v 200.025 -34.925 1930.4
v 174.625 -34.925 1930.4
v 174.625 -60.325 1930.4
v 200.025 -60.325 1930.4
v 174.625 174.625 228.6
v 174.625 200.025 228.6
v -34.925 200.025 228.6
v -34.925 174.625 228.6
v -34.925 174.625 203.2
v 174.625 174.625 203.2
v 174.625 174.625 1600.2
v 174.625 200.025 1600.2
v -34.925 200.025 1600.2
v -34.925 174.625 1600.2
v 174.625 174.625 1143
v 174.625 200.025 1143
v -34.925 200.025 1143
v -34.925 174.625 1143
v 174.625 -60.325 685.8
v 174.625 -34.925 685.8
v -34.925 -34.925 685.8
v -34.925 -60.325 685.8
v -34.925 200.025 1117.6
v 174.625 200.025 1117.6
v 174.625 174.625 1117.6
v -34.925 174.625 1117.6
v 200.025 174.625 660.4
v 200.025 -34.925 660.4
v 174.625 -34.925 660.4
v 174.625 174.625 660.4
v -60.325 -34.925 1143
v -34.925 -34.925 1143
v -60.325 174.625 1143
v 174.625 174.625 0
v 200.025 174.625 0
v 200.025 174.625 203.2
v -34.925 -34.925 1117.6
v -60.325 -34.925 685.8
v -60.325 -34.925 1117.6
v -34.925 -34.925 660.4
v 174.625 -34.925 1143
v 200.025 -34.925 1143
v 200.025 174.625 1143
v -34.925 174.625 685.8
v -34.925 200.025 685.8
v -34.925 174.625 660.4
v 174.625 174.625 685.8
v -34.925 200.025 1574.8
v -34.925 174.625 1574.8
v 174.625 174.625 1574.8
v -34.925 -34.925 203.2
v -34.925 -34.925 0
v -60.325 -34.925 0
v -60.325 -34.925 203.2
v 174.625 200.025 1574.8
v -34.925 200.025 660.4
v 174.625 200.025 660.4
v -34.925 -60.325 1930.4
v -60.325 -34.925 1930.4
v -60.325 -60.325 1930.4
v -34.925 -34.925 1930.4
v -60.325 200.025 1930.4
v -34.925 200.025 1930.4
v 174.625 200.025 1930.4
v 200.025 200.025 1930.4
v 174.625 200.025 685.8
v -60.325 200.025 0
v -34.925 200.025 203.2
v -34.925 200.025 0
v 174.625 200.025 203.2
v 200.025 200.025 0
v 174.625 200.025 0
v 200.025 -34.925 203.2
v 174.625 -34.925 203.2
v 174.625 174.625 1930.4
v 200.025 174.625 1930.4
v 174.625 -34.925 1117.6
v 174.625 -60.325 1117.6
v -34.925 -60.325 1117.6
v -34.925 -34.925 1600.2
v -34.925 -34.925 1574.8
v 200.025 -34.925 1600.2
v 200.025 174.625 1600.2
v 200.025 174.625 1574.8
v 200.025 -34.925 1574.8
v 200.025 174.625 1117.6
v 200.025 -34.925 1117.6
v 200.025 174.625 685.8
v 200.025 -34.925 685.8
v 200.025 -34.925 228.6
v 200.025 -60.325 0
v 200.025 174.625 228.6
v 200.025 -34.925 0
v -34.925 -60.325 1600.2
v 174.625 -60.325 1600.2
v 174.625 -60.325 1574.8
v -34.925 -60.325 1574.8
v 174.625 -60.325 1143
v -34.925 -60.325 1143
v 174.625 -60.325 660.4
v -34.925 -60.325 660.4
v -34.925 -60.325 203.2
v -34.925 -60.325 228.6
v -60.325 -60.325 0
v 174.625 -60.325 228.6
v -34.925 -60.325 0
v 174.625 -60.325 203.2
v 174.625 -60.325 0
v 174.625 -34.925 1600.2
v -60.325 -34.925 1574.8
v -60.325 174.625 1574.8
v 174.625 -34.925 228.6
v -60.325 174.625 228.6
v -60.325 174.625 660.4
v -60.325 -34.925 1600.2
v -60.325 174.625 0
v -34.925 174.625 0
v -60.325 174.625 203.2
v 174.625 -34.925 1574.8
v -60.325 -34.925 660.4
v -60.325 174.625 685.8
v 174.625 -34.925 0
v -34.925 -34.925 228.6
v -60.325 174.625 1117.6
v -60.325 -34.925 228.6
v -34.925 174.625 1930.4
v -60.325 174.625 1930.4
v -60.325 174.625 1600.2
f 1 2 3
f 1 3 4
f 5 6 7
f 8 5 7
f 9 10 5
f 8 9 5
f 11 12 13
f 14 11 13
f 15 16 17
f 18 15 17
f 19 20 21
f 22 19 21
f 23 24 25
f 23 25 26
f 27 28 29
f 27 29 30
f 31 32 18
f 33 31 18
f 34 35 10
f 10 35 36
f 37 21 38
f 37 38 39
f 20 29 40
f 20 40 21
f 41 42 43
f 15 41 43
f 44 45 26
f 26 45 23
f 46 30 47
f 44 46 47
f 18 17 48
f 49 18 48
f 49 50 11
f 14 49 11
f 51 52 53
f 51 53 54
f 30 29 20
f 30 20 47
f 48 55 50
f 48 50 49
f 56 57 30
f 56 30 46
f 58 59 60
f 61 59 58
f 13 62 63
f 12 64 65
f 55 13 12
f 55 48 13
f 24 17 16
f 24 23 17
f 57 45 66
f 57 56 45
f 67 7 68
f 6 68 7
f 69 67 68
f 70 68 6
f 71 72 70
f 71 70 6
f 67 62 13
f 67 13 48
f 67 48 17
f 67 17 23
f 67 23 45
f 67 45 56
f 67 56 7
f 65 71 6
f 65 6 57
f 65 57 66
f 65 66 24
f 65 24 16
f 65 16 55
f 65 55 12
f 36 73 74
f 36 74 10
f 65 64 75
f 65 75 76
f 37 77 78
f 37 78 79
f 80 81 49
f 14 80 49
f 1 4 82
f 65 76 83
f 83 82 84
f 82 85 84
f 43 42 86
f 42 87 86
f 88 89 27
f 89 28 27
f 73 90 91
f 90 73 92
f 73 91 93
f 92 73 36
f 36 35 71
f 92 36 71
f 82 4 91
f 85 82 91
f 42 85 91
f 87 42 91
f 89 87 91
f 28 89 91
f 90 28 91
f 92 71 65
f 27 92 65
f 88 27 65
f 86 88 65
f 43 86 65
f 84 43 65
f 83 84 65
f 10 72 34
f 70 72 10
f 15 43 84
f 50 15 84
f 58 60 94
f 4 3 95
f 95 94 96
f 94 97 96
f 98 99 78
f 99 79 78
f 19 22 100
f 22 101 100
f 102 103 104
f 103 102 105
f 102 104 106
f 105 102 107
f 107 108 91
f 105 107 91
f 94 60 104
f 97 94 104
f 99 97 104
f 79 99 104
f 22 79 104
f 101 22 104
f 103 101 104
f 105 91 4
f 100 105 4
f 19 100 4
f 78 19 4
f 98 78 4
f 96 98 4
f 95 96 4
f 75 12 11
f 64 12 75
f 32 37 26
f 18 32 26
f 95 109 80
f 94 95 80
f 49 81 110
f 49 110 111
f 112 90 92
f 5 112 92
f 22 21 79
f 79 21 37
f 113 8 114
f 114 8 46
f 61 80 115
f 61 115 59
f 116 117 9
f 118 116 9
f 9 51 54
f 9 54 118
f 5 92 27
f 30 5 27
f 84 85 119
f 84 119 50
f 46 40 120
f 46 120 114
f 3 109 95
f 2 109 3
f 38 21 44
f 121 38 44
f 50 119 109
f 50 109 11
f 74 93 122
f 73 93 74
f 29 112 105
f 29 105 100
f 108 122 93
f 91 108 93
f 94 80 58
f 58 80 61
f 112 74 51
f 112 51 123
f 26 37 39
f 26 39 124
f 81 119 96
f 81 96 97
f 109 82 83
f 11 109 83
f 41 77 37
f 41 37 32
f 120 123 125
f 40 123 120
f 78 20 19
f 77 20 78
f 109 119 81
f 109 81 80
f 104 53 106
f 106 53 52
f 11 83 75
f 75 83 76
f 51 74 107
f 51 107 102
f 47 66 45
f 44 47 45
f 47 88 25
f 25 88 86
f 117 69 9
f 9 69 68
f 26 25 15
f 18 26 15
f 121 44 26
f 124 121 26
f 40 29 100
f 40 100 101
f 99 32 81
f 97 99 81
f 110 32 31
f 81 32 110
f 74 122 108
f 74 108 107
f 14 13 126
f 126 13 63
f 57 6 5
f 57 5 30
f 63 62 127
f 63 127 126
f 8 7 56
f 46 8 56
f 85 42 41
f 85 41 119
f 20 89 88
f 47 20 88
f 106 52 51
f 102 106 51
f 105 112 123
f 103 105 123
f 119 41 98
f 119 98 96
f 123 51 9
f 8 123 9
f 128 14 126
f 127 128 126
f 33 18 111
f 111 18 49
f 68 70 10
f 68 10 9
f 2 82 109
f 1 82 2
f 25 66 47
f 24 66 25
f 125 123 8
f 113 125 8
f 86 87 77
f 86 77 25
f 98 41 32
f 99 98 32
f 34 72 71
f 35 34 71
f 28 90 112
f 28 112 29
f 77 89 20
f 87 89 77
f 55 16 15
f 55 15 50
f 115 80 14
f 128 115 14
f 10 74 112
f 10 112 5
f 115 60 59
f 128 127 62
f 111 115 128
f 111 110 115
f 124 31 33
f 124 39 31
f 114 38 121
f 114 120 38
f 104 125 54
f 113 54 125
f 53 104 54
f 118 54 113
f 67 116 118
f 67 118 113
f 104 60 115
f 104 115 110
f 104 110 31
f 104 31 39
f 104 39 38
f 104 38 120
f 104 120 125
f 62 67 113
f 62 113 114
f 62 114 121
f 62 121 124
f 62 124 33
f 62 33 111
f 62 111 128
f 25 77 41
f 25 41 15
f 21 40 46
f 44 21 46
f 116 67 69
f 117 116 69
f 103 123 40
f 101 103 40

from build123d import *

# Parameters (mm, degrees)
F0_W     = 260.35
F0_H     = 260.35
F0_W_2   = 209.55
F0_H_2   = 209.55
F1_DEPTH = 1930.4
F2_W     = 209.55
F2_H     = 330.2
F2_H_2   = 431.8
F2_H_3   = 203.2
F3_DEPTH = 260.35
F4_W     = 209.55
F4_H     = 203.2
F4_H_2   = 431.8
F4_H_3   = 330.2
F5_DEPTH = 260.35


with BuildPart() as f1:
    # F0 (on Top) → F1 (new body)
    with BuildSketch(Plane.XY):
        with Locations((69.85, 69.85)):
            Rectangle(F0_W, F0_H)
        with Locations((69.85, 69.85)):
            Rectangle(F0_W_2, F0_H_2, mode=Mode.SUBTRACT)
    extrude(amount=F1_DEPTH)

    # F2 (on face) → F3 (cut)
    with BuildSketch(Plane.YZ.offset(200.025)):
        with Locations((69.85, 1765.3)):
            Rectangle(F2_W, F2_H)
        with Locations((69.85, 1358.9)):
            Rectangle(F2_W, F2_H_2)
        with Locations((69.85, 901.7)):
            Rectangle(F2_W, F2_H_2)
        with Locations((69.85, 444.5)):
            Rectangle(F2_W, F2_H_2)
        with Locations((69.85, 101.6)):
            Rectangle(F2_W, F2_H_3)
    extrude(amount=-F3_DEPTH, mode=Mode.SUBTRACT)

    # F4 (on face) → F5 (cut)
    with BuildSketch(Plane(origin=(0, 200.025, 0), x_dir=(-1, 0, 0), z_dir=(0, 1, 0))):
        with Locations((-69.85, 101.6)):
            Rectangle(F4_W, F4_H)
        with Locations((-69.85, 444.5)):
            Rectangle(F4_W, F4_H_2)
        with Locations((-69.85, 901.7)):
            Rectangle(F4_W, F4_H_2)
        with Locations((-69.85, 1358.9)):
            Rectangle(F4_W, F4_H_2)
        with Locations((-69.85, 1765.3)):
            Rectangle(F4_W, F4_H_3)
    extrude(amount=-F5_DEPTH, mode=Mode.SUBTRACT)


solid = f1.part
